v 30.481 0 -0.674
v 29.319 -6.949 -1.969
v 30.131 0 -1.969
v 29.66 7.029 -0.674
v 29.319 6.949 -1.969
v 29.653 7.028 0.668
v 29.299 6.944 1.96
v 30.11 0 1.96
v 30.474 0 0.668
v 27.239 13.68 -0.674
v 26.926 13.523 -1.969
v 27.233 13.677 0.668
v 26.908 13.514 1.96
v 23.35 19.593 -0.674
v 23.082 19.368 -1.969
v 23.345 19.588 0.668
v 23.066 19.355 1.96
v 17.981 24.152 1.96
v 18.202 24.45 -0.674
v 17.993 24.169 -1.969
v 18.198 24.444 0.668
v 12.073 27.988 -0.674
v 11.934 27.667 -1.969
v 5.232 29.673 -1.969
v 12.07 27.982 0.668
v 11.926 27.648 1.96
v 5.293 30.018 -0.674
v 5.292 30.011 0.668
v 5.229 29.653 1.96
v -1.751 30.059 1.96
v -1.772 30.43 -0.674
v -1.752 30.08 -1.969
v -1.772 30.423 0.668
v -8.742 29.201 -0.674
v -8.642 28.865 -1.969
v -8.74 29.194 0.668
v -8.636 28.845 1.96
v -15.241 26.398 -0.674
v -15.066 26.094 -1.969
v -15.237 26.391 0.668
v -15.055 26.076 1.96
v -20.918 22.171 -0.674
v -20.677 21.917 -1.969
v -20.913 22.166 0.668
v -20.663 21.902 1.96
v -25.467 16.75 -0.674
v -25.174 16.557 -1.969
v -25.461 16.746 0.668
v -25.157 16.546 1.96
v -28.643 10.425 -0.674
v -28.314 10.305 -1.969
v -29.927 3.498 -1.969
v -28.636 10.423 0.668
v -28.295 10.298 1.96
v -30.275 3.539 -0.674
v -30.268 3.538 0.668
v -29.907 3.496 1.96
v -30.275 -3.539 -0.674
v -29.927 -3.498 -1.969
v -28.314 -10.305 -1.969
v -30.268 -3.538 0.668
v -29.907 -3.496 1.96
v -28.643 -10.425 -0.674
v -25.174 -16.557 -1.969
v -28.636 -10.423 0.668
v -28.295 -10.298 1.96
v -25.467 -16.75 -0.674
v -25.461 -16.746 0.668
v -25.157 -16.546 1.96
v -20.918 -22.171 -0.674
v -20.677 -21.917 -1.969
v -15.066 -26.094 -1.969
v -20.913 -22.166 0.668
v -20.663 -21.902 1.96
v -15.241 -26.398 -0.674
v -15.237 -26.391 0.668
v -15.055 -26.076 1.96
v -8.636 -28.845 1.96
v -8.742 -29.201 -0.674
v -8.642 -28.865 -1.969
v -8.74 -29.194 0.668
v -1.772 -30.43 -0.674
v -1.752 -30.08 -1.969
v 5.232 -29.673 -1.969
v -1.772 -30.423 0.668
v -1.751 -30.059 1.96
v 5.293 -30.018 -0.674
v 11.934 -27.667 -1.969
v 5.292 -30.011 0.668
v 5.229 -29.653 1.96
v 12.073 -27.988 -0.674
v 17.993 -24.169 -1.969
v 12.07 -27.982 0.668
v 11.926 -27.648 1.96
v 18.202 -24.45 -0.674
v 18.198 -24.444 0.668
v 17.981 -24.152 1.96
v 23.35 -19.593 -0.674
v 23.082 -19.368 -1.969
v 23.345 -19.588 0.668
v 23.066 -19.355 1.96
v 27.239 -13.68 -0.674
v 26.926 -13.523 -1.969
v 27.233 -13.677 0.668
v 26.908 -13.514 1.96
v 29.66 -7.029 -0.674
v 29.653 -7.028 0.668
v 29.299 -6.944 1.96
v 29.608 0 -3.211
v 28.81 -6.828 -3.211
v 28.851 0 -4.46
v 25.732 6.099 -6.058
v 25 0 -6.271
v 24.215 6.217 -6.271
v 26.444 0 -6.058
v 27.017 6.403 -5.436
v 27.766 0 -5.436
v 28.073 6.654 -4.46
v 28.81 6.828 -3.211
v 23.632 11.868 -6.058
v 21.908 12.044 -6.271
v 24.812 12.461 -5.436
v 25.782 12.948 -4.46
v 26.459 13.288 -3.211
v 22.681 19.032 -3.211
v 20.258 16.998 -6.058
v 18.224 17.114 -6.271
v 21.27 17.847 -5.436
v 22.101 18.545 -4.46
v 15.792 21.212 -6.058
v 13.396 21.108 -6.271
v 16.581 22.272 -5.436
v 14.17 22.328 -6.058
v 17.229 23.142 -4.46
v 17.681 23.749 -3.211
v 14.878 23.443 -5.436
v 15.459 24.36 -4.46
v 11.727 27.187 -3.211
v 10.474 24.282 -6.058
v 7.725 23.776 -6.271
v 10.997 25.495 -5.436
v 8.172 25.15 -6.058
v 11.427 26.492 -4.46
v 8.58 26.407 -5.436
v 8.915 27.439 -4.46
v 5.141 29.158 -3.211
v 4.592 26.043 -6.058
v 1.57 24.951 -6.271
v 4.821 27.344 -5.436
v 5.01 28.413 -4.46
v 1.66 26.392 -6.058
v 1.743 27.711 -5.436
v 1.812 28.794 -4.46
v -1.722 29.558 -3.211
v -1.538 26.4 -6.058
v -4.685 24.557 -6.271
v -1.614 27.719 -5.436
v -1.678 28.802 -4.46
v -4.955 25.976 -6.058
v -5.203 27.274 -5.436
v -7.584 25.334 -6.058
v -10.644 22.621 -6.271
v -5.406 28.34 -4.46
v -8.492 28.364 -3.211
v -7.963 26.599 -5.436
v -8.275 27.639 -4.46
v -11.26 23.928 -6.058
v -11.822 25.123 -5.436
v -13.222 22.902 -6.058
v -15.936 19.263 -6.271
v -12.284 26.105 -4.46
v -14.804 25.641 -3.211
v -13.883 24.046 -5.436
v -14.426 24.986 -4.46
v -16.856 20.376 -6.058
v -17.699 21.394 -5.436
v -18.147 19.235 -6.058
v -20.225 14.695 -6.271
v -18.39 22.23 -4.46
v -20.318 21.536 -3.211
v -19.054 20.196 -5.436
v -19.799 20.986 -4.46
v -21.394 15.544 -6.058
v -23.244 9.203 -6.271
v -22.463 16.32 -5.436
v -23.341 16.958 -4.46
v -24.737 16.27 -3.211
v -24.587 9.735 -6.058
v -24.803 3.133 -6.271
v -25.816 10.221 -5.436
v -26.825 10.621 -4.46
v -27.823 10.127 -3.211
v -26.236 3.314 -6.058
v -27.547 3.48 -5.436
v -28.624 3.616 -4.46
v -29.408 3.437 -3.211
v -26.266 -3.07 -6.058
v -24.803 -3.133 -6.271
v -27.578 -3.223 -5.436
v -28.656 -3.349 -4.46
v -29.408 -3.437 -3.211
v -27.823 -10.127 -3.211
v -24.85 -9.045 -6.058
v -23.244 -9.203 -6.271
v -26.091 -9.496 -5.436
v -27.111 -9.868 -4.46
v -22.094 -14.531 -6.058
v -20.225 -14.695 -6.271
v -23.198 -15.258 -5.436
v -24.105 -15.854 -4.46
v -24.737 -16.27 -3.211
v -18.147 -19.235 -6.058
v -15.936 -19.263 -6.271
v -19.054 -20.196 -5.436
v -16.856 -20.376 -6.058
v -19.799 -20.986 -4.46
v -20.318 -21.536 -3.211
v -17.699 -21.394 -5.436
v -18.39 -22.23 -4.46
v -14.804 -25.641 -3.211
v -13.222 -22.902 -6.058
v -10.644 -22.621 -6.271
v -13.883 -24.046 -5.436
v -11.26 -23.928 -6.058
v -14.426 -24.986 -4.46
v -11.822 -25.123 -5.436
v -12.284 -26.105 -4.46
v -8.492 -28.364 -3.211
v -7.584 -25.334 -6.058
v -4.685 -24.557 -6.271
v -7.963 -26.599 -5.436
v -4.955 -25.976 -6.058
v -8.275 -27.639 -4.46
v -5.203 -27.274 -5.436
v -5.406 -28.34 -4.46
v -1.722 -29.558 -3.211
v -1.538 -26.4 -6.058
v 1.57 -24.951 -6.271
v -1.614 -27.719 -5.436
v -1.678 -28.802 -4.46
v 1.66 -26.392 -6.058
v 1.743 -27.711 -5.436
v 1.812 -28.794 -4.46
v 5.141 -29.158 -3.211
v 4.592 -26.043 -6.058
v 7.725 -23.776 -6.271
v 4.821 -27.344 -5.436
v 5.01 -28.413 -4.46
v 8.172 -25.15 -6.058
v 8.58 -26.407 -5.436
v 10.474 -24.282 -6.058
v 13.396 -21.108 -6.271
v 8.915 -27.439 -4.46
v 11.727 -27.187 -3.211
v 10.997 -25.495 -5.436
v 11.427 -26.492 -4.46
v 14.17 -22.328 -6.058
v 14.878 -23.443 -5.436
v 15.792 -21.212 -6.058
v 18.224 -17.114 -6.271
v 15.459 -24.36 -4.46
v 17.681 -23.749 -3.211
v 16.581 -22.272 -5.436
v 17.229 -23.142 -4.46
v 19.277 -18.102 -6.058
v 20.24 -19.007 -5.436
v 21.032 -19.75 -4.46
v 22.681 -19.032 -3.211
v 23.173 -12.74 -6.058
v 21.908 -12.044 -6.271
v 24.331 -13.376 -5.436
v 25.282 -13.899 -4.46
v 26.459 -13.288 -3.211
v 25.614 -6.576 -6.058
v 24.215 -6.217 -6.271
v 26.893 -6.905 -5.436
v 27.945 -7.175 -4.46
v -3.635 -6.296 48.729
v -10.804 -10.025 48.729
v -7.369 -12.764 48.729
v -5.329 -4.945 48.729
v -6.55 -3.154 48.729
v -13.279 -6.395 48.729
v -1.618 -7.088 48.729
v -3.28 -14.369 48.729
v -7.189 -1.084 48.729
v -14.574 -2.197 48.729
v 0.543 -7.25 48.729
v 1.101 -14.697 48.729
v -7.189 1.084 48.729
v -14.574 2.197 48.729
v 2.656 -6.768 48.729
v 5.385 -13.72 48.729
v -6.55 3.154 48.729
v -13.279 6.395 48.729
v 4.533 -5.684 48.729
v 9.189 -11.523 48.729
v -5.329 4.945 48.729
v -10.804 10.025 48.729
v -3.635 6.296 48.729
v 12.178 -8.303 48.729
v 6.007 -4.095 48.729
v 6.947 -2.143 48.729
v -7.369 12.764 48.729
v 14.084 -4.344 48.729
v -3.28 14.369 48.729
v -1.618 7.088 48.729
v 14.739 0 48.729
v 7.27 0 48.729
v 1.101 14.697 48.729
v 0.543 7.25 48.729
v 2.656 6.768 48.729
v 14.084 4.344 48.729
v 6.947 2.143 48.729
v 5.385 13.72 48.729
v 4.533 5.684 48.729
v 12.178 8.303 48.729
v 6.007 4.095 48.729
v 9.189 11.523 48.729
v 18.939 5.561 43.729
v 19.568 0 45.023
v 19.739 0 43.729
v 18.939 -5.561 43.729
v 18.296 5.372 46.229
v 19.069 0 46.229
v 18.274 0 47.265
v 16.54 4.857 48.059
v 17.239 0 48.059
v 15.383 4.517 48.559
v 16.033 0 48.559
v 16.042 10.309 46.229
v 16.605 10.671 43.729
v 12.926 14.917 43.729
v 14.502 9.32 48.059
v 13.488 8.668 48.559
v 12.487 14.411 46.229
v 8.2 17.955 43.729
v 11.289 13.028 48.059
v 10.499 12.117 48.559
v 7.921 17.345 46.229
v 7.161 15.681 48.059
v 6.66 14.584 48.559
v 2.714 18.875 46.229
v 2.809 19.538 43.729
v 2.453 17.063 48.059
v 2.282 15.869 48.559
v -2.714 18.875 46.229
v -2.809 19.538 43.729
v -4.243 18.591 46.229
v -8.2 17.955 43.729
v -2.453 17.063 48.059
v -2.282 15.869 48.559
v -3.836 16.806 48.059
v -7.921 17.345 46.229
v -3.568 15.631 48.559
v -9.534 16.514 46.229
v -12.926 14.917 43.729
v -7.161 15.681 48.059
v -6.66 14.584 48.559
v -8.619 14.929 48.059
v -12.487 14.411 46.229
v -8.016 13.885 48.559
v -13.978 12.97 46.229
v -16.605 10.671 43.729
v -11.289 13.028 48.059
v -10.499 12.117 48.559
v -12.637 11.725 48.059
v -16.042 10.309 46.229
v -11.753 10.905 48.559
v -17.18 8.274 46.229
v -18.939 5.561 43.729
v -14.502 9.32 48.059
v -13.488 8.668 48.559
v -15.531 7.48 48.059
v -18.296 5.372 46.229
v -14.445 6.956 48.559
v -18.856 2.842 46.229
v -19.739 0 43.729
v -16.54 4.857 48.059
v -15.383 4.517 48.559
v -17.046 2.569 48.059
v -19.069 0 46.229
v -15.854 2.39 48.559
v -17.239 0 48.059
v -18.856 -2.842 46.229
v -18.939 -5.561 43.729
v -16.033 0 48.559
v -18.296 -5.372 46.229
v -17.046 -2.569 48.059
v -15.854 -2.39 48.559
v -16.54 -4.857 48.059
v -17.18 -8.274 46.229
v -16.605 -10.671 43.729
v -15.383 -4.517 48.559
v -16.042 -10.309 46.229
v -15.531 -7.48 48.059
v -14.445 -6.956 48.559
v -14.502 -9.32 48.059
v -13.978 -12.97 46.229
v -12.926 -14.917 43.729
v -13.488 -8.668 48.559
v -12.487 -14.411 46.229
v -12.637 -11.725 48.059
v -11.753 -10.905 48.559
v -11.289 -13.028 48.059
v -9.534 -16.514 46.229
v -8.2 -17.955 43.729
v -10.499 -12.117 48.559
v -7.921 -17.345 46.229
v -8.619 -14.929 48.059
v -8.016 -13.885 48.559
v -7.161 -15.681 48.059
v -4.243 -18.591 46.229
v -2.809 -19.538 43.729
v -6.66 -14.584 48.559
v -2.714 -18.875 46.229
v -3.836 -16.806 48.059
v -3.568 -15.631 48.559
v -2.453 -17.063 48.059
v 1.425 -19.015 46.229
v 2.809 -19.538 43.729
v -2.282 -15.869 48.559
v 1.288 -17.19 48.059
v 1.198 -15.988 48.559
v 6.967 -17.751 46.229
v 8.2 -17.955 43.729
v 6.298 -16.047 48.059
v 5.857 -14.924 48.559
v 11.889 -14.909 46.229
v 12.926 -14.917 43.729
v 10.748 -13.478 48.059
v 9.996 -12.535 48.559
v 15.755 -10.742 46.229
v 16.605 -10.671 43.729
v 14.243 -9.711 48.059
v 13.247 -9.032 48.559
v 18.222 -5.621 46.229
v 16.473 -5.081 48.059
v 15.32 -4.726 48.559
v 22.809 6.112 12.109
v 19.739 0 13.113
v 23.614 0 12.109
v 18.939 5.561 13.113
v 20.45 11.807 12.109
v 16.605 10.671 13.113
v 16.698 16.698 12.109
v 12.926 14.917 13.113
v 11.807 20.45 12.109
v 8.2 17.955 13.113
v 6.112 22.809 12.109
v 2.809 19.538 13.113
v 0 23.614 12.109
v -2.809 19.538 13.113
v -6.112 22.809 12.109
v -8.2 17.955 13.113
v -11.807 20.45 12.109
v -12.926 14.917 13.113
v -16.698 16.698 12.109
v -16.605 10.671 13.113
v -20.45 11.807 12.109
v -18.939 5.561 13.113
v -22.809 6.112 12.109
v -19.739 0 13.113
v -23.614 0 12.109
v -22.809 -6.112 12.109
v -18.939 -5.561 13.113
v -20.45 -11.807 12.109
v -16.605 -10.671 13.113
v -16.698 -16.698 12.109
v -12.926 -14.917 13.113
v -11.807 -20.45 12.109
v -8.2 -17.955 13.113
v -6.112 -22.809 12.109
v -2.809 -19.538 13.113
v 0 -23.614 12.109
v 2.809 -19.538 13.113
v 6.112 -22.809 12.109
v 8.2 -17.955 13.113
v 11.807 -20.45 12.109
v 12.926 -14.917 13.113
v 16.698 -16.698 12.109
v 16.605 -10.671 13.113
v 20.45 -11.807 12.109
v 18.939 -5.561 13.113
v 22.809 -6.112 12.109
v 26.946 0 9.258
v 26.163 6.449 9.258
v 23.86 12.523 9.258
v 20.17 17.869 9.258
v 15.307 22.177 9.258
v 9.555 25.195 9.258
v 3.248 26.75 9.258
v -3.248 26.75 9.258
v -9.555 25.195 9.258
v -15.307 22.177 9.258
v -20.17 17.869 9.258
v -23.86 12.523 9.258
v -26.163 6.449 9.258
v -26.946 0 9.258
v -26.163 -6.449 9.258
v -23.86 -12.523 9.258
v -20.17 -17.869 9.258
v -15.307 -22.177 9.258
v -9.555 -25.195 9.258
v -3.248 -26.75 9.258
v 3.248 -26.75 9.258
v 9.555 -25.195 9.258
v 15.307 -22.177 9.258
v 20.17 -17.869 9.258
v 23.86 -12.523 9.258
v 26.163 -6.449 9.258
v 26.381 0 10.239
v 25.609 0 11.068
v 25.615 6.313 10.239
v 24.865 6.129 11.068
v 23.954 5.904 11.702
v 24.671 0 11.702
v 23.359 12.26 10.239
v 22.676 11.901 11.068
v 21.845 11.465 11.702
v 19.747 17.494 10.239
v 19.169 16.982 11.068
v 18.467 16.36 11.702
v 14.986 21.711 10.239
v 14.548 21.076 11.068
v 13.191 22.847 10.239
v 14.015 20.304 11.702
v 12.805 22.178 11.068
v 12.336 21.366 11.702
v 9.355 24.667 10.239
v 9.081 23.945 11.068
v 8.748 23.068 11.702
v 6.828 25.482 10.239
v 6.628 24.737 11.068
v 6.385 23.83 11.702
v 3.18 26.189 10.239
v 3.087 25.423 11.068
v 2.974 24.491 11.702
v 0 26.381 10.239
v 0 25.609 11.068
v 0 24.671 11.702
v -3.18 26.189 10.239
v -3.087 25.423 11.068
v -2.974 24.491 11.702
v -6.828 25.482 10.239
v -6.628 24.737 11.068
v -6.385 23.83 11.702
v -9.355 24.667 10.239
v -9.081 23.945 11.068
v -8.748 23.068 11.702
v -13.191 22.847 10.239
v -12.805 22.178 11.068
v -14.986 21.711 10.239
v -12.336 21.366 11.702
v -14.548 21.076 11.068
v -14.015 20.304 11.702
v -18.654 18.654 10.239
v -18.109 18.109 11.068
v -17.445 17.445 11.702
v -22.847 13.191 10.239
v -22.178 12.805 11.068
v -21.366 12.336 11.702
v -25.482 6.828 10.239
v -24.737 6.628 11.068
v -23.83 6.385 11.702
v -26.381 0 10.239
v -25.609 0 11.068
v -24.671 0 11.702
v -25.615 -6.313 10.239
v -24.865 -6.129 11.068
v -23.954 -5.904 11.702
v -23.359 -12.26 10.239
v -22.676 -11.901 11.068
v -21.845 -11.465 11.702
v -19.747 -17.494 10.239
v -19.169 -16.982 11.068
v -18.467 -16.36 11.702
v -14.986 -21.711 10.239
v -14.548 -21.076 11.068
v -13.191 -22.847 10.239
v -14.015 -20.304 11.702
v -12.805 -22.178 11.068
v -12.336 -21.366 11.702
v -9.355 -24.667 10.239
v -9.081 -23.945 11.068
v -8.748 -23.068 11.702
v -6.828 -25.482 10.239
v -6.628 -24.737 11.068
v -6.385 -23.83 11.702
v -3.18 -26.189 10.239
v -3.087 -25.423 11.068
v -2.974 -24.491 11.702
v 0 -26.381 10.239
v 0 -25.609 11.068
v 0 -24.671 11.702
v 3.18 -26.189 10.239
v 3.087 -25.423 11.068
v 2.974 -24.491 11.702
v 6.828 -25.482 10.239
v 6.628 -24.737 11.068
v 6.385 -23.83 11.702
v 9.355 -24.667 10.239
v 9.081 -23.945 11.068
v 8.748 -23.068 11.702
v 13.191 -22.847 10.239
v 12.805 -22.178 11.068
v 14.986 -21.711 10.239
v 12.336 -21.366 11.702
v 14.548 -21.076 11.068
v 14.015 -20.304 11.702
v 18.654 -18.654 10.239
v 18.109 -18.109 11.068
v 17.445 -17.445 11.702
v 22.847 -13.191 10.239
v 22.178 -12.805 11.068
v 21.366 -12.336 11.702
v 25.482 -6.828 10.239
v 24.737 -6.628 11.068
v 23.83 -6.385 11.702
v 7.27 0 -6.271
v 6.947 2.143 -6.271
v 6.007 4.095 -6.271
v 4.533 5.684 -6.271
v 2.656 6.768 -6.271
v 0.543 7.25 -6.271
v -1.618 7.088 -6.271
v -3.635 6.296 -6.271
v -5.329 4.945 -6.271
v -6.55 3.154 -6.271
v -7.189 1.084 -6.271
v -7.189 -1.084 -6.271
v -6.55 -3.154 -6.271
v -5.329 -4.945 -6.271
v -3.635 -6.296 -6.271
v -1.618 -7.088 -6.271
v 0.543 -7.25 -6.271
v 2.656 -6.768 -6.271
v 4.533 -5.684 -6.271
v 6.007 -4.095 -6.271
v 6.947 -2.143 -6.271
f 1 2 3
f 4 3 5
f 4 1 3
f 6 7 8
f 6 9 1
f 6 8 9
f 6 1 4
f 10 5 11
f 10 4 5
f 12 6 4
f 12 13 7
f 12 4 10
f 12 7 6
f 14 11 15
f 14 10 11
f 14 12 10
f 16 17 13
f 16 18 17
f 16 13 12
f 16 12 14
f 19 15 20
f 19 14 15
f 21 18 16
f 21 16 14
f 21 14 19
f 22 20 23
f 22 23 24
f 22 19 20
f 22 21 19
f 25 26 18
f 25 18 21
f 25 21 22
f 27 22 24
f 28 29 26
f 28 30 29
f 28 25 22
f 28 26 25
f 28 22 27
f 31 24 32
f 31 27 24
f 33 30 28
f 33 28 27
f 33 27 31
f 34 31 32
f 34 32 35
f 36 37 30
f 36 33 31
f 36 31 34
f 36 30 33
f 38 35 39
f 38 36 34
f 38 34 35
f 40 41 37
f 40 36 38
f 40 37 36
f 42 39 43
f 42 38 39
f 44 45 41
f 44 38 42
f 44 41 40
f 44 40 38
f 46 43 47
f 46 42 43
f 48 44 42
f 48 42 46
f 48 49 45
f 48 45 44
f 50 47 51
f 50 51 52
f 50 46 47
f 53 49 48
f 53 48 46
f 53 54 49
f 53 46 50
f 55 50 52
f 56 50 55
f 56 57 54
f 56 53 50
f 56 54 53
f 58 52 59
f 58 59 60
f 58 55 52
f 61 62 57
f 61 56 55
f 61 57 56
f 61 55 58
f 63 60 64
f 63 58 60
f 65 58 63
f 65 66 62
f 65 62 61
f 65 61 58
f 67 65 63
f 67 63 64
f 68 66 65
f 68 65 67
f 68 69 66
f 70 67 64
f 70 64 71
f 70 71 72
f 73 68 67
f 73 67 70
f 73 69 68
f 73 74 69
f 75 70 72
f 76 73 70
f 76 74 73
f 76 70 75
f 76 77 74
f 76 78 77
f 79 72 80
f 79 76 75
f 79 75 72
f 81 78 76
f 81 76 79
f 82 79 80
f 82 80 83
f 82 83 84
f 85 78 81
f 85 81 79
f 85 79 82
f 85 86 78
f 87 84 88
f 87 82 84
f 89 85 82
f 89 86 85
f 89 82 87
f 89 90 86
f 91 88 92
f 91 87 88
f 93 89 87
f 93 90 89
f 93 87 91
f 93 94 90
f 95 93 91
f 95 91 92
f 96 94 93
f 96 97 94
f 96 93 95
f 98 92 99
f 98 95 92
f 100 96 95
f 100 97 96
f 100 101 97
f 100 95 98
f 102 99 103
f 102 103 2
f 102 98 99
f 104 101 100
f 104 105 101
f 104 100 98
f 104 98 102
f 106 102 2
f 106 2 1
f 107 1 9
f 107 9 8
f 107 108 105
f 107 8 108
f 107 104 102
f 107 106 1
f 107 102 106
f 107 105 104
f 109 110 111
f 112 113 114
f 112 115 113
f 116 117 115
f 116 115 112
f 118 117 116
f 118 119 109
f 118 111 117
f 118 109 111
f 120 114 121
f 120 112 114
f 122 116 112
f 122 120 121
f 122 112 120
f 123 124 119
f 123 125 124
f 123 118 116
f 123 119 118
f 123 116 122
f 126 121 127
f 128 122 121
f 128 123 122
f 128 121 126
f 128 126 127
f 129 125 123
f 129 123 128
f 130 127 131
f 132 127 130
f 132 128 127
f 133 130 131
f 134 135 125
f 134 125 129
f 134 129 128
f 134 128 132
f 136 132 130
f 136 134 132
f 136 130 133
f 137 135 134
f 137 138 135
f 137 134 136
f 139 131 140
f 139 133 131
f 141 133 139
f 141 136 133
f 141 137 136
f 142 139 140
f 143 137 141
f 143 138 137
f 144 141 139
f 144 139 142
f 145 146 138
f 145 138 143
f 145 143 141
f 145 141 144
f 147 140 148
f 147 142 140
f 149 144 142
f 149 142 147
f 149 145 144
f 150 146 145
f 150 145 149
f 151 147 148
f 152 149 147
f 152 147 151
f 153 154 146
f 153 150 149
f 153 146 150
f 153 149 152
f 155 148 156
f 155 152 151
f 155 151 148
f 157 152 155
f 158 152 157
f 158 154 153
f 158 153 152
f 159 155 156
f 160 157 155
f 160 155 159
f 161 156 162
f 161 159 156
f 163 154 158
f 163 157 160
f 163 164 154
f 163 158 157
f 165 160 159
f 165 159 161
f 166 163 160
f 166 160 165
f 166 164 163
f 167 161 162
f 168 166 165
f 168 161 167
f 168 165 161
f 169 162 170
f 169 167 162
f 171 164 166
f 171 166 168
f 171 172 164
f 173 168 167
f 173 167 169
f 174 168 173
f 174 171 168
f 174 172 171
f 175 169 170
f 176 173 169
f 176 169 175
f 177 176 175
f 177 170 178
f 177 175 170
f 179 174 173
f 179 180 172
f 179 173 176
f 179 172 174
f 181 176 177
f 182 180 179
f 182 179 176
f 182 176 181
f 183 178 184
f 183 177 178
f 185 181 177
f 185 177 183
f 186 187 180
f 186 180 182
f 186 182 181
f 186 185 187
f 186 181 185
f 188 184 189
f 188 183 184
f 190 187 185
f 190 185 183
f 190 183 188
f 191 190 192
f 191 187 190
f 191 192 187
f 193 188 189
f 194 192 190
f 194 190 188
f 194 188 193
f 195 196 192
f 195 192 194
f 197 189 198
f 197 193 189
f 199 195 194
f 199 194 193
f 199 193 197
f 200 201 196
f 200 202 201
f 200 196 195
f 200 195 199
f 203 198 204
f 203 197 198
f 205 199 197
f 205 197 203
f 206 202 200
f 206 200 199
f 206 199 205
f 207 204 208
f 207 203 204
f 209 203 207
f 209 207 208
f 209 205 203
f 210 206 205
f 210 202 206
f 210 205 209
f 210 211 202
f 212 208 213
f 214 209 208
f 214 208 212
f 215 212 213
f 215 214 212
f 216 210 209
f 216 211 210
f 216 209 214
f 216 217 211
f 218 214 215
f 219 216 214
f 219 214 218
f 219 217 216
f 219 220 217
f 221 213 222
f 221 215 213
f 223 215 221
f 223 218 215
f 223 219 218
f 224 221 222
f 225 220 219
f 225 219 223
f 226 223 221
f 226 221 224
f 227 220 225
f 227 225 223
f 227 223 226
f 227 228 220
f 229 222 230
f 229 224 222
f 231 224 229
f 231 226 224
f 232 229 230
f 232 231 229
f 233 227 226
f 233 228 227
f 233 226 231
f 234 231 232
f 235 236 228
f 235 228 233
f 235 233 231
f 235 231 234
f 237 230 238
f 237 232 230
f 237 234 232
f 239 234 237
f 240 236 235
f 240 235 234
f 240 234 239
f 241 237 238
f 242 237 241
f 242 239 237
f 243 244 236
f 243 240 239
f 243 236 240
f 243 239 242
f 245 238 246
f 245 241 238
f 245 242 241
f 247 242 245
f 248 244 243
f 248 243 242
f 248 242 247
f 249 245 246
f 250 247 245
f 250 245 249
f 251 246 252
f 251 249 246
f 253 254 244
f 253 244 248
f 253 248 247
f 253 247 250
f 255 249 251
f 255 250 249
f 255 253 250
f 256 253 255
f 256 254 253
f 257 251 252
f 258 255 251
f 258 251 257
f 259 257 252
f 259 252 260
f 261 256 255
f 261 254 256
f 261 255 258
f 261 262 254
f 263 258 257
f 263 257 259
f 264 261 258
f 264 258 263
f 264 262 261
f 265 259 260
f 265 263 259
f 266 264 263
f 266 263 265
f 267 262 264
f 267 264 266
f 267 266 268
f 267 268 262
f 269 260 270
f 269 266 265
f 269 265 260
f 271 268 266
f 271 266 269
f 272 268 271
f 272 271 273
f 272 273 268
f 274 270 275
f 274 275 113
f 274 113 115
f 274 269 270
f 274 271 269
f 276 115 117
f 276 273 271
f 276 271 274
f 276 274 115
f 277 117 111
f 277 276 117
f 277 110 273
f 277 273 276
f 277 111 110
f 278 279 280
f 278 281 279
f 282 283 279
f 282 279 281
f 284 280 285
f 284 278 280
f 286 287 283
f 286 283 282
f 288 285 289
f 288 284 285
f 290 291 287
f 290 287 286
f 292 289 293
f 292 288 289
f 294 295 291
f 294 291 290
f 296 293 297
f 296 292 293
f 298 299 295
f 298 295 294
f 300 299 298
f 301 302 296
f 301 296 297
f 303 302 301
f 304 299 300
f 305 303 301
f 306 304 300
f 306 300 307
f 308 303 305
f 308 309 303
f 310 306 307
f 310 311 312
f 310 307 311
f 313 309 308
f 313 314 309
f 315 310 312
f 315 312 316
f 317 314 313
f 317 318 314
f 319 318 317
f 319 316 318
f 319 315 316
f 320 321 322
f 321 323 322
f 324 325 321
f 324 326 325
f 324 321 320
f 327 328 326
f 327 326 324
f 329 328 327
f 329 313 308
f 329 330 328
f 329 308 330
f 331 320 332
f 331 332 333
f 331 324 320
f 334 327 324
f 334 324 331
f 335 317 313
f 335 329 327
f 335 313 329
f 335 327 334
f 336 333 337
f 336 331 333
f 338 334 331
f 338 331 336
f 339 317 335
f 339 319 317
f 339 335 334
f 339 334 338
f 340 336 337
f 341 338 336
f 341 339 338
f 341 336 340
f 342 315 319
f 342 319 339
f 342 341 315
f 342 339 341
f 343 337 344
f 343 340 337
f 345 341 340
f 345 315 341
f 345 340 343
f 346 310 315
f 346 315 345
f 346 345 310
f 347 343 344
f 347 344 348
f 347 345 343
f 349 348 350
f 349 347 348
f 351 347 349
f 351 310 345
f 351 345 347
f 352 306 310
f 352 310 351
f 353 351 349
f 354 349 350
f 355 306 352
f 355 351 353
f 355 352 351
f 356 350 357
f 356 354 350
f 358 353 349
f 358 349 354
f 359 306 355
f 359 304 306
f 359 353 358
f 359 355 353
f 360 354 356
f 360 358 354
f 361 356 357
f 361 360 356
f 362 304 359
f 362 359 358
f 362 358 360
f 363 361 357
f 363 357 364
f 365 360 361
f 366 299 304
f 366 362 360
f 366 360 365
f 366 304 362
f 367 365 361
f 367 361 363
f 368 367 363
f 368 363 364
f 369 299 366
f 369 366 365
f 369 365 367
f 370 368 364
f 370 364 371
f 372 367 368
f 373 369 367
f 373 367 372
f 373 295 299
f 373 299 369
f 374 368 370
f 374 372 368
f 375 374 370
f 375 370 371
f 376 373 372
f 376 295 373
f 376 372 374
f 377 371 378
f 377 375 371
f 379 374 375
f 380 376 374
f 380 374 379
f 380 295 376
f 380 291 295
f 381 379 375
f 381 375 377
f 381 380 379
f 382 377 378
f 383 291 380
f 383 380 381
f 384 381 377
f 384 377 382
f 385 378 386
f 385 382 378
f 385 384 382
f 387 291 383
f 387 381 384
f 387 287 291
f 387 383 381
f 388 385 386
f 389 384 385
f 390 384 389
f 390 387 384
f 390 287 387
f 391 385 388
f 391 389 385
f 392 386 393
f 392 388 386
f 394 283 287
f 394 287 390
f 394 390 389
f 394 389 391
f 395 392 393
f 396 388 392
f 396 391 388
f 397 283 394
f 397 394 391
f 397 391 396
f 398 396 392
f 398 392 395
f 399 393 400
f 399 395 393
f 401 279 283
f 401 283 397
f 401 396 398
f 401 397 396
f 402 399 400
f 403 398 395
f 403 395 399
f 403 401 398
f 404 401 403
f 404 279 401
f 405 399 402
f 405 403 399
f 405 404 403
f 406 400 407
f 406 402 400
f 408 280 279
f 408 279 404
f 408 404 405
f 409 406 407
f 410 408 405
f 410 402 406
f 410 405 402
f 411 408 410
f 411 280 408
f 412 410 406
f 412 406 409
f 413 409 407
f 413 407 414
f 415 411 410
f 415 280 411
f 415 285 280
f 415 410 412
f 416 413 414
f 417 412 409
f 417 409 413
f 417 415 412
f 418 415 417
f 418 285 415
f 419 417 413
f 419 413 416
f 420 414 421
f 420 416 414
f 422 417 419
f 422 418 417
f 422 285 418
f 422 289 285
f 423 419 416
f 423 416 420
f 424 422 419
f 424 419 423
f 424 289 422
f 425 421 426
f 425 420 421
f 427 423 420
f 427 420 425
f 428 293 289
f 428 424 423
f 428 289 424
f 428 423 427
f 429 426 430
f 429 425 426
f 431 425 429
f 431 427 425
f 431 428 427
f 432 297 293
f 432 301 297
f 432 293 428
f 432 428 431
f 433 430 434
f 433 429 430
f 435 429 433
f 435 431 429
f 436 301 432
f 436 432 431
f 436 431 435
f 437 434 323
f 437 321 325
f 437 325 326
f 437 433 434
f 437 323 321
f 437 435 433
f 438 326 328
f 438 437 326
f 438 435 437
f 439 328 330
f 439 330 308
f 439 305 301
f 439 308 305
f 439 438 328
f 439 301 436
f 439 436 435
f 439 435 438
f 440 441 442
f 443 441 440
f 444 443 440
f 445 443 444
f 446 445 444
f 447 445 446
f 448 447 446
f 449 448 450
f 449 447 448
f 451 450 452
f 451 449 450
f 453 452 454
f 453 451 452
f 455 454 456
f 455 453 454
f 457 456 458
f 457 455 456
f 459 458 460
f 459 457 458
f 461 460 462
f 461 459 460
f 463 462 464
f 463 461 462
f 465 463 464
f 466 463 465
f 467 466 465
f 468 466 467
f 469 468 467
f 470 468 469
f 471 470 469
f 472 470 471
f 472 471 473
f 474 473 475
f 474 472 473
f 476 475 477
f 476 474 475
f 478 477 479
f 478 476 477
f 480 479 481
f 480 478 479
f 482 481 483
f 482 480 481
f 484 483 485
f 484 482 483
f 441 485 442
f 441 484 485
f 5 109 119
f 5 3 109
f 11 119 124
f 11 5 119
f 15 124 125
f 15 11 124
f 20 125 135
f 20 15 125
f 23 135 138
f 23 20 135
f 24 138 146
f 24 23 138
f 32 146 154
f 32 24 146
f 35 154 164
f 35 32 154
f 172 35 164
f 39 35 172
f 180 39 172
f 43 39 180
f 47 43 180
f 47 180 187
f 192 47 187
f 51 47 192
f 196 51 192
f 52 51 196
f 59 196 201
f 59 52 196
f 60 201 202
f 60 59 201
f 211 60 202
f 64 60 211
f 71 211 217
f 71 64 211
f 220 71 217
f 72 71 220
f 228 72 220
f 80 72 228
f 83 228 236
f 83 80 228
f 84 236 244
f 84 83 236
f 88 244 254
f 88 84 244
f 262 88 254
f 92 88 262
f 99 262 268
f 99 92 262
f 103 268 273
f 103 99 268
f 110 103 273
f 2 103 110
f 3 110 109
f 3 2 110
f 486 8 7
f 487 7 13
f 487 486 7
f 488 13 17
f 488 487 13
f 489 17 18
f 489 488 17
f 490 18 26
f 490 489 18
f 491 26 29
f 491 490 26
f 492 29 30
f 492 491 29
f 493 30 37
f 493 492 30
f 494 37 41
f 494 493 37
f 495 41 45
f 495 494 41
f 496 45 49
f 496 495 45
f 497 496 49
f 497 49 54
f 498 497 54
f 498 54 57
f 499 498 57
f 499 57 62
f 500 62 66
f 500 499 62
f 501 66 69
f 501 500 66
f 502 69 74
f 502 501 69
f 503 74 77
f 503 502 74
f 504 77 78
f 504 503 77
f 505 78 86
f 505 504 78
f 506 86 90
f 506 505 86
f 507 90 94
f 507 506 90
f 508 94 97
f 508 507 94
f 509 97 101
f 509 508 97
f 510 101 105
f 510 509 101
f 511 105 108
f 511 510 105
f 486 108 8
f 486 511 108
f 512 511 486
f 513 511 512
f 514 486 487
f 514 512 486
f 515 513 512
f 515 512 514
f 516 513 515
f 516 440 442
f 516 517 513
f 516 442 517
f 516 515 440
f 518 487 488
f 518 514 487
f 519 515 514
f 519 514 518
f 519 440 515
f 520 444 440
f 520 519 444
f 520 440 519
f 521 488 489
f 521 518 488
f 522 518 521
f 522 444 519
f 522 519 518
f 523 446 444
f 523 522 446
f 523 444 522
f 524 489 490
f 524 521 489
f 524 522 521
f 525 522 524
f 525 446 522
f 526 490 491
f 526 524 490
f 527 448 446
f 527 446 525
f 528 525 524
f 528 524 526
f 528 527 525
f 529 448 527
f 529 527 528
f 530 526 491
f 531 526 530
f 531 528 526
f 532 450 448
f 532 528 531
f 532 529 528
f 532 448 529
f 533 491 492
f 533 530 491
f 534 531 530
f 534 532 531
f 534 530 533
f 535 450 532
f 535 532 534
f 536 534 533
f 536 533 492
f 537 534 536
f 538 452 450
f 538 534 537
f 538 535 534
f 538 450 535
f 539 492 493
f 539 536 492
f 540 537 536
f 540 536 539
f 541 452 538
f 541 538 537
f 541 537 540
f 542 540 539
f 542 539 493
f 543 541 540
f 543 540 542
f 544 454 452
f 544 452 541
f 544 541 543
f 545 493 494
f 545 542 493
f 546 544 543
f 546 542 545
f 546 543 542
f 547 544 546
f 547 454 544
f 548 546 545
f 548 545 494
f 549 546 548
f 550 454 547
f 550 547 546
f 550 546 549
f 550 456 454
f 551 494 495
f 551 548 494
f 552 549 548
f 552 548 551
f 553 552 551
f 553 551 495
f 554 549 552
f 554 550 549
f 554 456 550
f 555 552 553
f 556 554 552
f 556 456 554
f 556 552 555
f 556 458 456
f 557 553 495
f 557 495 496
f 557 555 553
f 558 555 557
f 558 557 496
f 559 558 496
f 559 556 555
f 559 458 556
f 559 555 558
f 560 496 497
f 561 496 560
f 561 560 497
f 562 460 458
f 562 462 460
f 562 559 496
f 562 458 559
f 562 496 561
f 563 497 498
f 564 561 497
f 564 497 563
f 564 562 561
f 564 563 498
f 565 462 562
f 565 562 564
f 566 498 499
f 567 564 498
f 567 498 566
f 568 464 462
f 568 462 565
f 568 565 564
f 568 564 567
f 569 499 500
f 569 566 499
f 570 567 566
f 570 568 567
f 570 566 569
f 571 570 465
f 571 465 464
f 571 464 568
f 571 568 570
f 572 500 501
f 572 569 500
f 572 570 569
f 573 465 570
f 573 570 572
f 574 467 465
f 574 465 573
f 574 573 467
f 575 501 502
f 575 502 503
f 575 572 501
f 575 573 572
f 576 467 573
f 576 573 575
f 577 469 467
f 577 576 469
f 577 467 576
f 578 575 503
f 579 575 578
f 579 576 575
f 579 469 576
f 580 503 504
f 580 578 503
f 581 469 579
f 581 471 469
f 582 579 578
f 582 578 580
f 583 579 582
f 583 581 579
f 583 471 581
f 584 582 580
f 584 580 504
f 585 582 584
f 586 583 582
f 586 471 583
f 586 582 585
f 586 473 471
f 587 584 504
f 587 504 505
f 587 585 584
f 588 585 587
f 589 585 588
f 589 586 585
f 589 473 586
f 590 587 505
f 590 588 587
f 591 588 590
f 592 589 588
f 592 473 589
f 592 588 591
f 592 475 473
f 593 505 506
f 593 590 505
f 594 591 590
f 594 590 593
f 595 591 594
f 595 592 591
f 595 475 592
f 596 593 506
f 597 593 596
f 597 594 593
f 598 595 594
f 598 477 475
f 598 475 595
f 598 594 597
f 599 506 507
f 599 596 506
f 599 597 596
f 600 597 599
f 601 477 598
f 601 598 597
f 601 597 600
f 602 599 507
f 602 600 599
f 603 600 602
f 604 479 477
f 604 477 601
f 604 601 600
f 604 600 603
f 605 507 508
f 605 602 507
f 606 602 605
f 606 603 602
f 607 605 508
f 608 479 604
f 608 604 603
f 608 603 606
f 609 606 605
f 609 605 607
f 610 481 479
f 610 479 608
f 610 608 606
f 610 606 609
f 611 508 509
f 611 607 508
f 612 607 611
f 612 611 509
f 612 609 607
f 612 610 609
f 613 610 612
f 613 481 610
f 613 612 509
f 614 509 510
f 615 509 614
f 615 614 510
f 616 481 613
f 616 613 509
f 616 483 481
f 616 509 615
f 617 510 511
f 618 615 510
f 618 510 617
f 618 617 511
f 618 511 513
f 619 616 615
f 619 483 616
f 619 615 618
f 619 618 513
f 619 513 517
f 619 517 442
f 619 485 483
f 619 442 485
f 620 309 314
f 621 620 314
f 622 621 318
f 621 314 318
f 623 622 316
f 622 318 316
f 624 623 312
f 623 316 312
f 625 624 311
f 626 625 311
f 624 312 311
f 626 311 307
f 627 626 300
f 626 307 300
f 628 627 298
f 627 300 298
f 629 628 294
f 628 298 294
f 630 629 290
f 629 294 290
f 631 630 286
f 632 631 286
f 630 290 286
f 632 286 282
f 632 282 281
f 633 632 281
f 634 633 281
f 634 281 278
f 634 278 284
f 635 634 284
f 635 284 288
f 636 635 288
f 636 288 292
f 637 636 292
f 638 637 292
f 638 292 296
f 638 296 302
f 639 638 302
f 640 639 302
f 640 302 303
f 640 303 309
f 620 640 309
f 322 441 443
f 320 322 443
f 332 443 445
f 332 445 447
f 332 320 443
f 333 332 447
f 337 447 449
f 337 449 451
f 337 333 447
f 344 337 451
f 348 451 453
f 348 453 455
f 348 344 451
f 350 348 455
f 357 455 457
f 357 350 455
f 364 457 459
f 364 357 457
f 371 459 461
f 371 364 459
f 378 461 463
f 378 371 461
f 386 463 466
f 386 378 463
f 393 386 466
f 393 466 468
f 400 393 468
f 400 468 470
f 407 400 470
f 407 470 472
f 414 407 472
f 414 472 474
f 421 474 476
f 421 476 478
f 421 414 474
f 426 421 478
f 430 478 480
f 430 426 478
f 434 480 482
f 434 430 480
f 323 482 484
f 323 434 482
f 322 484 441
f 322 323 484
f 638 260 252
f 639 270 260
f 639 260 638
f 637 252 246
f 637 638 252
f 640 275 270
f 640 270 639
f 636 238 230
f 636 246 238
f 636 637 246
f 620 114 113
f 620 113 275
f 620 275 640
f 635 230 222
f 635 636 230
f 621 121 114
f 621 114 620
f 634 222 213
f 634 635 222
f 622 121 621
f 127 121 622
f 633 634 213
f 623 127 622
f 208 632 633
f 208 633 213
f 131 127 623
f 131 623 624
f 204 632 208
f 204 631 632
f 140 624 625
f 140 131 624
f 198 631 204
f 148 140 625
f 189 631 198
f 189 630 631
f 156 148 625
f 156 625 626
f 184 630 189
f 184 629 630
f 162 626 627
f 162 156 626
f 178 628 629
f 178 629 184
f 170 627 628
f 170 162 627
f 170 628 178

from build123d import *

# Parameters (mm, degrees)
F2_R     = 7.270103
F3_DEPTH = 55.001


with BuildPart() as f1:
    # F0 (on Front) → F1 (revolve)
    with BuildSketch(Plane.XZ):
        with BuildLine():
            Line((14.738567, 48.729044), (0, 48.729044))
            Line((0, 48.729044), (0, -6.270956))
            Line((0, -6.270956), (25, -6.270956))
            ThreePointArc((25, -6.270956), (27.765735, -5.436374), (29.608177, -3.21124))
            Line((29.608177, -3.21124), (30.131203, -1.969053))
            ThreePointArc((30.131203, -1.969053), (30.522956, -0.002314), (30.110414, 1.96017))
            Line((30.110414, 1.96017), (26.946491, 9.257603))
            ThreePointArc((26.946491, 9.257603), (25.609479, 11.068015), (23.613915, 12.10865))
            Line((23.613915, 12.10865), (19.738567, 13.11337))
            Line((19.738567, 13.11337), (19.738567, 43.729044))
            ThreePointArc((19.738567, 43.729044), (18.274101, 47.264578), (14.738567, 48.729044))
        make_face()
    revolve(axis=Axis((0, 0, 21.229044), (0, 0, 1)))

    # F2 (on face) → F3 (cut, through all)
    with BuildSketch(Plane.XY.offset(48.729044)):
        Circle(F2_R)
    extrude(amount=-F3_DEPTH, mode=Mode.SUBTRACT)


solid = f1.part
